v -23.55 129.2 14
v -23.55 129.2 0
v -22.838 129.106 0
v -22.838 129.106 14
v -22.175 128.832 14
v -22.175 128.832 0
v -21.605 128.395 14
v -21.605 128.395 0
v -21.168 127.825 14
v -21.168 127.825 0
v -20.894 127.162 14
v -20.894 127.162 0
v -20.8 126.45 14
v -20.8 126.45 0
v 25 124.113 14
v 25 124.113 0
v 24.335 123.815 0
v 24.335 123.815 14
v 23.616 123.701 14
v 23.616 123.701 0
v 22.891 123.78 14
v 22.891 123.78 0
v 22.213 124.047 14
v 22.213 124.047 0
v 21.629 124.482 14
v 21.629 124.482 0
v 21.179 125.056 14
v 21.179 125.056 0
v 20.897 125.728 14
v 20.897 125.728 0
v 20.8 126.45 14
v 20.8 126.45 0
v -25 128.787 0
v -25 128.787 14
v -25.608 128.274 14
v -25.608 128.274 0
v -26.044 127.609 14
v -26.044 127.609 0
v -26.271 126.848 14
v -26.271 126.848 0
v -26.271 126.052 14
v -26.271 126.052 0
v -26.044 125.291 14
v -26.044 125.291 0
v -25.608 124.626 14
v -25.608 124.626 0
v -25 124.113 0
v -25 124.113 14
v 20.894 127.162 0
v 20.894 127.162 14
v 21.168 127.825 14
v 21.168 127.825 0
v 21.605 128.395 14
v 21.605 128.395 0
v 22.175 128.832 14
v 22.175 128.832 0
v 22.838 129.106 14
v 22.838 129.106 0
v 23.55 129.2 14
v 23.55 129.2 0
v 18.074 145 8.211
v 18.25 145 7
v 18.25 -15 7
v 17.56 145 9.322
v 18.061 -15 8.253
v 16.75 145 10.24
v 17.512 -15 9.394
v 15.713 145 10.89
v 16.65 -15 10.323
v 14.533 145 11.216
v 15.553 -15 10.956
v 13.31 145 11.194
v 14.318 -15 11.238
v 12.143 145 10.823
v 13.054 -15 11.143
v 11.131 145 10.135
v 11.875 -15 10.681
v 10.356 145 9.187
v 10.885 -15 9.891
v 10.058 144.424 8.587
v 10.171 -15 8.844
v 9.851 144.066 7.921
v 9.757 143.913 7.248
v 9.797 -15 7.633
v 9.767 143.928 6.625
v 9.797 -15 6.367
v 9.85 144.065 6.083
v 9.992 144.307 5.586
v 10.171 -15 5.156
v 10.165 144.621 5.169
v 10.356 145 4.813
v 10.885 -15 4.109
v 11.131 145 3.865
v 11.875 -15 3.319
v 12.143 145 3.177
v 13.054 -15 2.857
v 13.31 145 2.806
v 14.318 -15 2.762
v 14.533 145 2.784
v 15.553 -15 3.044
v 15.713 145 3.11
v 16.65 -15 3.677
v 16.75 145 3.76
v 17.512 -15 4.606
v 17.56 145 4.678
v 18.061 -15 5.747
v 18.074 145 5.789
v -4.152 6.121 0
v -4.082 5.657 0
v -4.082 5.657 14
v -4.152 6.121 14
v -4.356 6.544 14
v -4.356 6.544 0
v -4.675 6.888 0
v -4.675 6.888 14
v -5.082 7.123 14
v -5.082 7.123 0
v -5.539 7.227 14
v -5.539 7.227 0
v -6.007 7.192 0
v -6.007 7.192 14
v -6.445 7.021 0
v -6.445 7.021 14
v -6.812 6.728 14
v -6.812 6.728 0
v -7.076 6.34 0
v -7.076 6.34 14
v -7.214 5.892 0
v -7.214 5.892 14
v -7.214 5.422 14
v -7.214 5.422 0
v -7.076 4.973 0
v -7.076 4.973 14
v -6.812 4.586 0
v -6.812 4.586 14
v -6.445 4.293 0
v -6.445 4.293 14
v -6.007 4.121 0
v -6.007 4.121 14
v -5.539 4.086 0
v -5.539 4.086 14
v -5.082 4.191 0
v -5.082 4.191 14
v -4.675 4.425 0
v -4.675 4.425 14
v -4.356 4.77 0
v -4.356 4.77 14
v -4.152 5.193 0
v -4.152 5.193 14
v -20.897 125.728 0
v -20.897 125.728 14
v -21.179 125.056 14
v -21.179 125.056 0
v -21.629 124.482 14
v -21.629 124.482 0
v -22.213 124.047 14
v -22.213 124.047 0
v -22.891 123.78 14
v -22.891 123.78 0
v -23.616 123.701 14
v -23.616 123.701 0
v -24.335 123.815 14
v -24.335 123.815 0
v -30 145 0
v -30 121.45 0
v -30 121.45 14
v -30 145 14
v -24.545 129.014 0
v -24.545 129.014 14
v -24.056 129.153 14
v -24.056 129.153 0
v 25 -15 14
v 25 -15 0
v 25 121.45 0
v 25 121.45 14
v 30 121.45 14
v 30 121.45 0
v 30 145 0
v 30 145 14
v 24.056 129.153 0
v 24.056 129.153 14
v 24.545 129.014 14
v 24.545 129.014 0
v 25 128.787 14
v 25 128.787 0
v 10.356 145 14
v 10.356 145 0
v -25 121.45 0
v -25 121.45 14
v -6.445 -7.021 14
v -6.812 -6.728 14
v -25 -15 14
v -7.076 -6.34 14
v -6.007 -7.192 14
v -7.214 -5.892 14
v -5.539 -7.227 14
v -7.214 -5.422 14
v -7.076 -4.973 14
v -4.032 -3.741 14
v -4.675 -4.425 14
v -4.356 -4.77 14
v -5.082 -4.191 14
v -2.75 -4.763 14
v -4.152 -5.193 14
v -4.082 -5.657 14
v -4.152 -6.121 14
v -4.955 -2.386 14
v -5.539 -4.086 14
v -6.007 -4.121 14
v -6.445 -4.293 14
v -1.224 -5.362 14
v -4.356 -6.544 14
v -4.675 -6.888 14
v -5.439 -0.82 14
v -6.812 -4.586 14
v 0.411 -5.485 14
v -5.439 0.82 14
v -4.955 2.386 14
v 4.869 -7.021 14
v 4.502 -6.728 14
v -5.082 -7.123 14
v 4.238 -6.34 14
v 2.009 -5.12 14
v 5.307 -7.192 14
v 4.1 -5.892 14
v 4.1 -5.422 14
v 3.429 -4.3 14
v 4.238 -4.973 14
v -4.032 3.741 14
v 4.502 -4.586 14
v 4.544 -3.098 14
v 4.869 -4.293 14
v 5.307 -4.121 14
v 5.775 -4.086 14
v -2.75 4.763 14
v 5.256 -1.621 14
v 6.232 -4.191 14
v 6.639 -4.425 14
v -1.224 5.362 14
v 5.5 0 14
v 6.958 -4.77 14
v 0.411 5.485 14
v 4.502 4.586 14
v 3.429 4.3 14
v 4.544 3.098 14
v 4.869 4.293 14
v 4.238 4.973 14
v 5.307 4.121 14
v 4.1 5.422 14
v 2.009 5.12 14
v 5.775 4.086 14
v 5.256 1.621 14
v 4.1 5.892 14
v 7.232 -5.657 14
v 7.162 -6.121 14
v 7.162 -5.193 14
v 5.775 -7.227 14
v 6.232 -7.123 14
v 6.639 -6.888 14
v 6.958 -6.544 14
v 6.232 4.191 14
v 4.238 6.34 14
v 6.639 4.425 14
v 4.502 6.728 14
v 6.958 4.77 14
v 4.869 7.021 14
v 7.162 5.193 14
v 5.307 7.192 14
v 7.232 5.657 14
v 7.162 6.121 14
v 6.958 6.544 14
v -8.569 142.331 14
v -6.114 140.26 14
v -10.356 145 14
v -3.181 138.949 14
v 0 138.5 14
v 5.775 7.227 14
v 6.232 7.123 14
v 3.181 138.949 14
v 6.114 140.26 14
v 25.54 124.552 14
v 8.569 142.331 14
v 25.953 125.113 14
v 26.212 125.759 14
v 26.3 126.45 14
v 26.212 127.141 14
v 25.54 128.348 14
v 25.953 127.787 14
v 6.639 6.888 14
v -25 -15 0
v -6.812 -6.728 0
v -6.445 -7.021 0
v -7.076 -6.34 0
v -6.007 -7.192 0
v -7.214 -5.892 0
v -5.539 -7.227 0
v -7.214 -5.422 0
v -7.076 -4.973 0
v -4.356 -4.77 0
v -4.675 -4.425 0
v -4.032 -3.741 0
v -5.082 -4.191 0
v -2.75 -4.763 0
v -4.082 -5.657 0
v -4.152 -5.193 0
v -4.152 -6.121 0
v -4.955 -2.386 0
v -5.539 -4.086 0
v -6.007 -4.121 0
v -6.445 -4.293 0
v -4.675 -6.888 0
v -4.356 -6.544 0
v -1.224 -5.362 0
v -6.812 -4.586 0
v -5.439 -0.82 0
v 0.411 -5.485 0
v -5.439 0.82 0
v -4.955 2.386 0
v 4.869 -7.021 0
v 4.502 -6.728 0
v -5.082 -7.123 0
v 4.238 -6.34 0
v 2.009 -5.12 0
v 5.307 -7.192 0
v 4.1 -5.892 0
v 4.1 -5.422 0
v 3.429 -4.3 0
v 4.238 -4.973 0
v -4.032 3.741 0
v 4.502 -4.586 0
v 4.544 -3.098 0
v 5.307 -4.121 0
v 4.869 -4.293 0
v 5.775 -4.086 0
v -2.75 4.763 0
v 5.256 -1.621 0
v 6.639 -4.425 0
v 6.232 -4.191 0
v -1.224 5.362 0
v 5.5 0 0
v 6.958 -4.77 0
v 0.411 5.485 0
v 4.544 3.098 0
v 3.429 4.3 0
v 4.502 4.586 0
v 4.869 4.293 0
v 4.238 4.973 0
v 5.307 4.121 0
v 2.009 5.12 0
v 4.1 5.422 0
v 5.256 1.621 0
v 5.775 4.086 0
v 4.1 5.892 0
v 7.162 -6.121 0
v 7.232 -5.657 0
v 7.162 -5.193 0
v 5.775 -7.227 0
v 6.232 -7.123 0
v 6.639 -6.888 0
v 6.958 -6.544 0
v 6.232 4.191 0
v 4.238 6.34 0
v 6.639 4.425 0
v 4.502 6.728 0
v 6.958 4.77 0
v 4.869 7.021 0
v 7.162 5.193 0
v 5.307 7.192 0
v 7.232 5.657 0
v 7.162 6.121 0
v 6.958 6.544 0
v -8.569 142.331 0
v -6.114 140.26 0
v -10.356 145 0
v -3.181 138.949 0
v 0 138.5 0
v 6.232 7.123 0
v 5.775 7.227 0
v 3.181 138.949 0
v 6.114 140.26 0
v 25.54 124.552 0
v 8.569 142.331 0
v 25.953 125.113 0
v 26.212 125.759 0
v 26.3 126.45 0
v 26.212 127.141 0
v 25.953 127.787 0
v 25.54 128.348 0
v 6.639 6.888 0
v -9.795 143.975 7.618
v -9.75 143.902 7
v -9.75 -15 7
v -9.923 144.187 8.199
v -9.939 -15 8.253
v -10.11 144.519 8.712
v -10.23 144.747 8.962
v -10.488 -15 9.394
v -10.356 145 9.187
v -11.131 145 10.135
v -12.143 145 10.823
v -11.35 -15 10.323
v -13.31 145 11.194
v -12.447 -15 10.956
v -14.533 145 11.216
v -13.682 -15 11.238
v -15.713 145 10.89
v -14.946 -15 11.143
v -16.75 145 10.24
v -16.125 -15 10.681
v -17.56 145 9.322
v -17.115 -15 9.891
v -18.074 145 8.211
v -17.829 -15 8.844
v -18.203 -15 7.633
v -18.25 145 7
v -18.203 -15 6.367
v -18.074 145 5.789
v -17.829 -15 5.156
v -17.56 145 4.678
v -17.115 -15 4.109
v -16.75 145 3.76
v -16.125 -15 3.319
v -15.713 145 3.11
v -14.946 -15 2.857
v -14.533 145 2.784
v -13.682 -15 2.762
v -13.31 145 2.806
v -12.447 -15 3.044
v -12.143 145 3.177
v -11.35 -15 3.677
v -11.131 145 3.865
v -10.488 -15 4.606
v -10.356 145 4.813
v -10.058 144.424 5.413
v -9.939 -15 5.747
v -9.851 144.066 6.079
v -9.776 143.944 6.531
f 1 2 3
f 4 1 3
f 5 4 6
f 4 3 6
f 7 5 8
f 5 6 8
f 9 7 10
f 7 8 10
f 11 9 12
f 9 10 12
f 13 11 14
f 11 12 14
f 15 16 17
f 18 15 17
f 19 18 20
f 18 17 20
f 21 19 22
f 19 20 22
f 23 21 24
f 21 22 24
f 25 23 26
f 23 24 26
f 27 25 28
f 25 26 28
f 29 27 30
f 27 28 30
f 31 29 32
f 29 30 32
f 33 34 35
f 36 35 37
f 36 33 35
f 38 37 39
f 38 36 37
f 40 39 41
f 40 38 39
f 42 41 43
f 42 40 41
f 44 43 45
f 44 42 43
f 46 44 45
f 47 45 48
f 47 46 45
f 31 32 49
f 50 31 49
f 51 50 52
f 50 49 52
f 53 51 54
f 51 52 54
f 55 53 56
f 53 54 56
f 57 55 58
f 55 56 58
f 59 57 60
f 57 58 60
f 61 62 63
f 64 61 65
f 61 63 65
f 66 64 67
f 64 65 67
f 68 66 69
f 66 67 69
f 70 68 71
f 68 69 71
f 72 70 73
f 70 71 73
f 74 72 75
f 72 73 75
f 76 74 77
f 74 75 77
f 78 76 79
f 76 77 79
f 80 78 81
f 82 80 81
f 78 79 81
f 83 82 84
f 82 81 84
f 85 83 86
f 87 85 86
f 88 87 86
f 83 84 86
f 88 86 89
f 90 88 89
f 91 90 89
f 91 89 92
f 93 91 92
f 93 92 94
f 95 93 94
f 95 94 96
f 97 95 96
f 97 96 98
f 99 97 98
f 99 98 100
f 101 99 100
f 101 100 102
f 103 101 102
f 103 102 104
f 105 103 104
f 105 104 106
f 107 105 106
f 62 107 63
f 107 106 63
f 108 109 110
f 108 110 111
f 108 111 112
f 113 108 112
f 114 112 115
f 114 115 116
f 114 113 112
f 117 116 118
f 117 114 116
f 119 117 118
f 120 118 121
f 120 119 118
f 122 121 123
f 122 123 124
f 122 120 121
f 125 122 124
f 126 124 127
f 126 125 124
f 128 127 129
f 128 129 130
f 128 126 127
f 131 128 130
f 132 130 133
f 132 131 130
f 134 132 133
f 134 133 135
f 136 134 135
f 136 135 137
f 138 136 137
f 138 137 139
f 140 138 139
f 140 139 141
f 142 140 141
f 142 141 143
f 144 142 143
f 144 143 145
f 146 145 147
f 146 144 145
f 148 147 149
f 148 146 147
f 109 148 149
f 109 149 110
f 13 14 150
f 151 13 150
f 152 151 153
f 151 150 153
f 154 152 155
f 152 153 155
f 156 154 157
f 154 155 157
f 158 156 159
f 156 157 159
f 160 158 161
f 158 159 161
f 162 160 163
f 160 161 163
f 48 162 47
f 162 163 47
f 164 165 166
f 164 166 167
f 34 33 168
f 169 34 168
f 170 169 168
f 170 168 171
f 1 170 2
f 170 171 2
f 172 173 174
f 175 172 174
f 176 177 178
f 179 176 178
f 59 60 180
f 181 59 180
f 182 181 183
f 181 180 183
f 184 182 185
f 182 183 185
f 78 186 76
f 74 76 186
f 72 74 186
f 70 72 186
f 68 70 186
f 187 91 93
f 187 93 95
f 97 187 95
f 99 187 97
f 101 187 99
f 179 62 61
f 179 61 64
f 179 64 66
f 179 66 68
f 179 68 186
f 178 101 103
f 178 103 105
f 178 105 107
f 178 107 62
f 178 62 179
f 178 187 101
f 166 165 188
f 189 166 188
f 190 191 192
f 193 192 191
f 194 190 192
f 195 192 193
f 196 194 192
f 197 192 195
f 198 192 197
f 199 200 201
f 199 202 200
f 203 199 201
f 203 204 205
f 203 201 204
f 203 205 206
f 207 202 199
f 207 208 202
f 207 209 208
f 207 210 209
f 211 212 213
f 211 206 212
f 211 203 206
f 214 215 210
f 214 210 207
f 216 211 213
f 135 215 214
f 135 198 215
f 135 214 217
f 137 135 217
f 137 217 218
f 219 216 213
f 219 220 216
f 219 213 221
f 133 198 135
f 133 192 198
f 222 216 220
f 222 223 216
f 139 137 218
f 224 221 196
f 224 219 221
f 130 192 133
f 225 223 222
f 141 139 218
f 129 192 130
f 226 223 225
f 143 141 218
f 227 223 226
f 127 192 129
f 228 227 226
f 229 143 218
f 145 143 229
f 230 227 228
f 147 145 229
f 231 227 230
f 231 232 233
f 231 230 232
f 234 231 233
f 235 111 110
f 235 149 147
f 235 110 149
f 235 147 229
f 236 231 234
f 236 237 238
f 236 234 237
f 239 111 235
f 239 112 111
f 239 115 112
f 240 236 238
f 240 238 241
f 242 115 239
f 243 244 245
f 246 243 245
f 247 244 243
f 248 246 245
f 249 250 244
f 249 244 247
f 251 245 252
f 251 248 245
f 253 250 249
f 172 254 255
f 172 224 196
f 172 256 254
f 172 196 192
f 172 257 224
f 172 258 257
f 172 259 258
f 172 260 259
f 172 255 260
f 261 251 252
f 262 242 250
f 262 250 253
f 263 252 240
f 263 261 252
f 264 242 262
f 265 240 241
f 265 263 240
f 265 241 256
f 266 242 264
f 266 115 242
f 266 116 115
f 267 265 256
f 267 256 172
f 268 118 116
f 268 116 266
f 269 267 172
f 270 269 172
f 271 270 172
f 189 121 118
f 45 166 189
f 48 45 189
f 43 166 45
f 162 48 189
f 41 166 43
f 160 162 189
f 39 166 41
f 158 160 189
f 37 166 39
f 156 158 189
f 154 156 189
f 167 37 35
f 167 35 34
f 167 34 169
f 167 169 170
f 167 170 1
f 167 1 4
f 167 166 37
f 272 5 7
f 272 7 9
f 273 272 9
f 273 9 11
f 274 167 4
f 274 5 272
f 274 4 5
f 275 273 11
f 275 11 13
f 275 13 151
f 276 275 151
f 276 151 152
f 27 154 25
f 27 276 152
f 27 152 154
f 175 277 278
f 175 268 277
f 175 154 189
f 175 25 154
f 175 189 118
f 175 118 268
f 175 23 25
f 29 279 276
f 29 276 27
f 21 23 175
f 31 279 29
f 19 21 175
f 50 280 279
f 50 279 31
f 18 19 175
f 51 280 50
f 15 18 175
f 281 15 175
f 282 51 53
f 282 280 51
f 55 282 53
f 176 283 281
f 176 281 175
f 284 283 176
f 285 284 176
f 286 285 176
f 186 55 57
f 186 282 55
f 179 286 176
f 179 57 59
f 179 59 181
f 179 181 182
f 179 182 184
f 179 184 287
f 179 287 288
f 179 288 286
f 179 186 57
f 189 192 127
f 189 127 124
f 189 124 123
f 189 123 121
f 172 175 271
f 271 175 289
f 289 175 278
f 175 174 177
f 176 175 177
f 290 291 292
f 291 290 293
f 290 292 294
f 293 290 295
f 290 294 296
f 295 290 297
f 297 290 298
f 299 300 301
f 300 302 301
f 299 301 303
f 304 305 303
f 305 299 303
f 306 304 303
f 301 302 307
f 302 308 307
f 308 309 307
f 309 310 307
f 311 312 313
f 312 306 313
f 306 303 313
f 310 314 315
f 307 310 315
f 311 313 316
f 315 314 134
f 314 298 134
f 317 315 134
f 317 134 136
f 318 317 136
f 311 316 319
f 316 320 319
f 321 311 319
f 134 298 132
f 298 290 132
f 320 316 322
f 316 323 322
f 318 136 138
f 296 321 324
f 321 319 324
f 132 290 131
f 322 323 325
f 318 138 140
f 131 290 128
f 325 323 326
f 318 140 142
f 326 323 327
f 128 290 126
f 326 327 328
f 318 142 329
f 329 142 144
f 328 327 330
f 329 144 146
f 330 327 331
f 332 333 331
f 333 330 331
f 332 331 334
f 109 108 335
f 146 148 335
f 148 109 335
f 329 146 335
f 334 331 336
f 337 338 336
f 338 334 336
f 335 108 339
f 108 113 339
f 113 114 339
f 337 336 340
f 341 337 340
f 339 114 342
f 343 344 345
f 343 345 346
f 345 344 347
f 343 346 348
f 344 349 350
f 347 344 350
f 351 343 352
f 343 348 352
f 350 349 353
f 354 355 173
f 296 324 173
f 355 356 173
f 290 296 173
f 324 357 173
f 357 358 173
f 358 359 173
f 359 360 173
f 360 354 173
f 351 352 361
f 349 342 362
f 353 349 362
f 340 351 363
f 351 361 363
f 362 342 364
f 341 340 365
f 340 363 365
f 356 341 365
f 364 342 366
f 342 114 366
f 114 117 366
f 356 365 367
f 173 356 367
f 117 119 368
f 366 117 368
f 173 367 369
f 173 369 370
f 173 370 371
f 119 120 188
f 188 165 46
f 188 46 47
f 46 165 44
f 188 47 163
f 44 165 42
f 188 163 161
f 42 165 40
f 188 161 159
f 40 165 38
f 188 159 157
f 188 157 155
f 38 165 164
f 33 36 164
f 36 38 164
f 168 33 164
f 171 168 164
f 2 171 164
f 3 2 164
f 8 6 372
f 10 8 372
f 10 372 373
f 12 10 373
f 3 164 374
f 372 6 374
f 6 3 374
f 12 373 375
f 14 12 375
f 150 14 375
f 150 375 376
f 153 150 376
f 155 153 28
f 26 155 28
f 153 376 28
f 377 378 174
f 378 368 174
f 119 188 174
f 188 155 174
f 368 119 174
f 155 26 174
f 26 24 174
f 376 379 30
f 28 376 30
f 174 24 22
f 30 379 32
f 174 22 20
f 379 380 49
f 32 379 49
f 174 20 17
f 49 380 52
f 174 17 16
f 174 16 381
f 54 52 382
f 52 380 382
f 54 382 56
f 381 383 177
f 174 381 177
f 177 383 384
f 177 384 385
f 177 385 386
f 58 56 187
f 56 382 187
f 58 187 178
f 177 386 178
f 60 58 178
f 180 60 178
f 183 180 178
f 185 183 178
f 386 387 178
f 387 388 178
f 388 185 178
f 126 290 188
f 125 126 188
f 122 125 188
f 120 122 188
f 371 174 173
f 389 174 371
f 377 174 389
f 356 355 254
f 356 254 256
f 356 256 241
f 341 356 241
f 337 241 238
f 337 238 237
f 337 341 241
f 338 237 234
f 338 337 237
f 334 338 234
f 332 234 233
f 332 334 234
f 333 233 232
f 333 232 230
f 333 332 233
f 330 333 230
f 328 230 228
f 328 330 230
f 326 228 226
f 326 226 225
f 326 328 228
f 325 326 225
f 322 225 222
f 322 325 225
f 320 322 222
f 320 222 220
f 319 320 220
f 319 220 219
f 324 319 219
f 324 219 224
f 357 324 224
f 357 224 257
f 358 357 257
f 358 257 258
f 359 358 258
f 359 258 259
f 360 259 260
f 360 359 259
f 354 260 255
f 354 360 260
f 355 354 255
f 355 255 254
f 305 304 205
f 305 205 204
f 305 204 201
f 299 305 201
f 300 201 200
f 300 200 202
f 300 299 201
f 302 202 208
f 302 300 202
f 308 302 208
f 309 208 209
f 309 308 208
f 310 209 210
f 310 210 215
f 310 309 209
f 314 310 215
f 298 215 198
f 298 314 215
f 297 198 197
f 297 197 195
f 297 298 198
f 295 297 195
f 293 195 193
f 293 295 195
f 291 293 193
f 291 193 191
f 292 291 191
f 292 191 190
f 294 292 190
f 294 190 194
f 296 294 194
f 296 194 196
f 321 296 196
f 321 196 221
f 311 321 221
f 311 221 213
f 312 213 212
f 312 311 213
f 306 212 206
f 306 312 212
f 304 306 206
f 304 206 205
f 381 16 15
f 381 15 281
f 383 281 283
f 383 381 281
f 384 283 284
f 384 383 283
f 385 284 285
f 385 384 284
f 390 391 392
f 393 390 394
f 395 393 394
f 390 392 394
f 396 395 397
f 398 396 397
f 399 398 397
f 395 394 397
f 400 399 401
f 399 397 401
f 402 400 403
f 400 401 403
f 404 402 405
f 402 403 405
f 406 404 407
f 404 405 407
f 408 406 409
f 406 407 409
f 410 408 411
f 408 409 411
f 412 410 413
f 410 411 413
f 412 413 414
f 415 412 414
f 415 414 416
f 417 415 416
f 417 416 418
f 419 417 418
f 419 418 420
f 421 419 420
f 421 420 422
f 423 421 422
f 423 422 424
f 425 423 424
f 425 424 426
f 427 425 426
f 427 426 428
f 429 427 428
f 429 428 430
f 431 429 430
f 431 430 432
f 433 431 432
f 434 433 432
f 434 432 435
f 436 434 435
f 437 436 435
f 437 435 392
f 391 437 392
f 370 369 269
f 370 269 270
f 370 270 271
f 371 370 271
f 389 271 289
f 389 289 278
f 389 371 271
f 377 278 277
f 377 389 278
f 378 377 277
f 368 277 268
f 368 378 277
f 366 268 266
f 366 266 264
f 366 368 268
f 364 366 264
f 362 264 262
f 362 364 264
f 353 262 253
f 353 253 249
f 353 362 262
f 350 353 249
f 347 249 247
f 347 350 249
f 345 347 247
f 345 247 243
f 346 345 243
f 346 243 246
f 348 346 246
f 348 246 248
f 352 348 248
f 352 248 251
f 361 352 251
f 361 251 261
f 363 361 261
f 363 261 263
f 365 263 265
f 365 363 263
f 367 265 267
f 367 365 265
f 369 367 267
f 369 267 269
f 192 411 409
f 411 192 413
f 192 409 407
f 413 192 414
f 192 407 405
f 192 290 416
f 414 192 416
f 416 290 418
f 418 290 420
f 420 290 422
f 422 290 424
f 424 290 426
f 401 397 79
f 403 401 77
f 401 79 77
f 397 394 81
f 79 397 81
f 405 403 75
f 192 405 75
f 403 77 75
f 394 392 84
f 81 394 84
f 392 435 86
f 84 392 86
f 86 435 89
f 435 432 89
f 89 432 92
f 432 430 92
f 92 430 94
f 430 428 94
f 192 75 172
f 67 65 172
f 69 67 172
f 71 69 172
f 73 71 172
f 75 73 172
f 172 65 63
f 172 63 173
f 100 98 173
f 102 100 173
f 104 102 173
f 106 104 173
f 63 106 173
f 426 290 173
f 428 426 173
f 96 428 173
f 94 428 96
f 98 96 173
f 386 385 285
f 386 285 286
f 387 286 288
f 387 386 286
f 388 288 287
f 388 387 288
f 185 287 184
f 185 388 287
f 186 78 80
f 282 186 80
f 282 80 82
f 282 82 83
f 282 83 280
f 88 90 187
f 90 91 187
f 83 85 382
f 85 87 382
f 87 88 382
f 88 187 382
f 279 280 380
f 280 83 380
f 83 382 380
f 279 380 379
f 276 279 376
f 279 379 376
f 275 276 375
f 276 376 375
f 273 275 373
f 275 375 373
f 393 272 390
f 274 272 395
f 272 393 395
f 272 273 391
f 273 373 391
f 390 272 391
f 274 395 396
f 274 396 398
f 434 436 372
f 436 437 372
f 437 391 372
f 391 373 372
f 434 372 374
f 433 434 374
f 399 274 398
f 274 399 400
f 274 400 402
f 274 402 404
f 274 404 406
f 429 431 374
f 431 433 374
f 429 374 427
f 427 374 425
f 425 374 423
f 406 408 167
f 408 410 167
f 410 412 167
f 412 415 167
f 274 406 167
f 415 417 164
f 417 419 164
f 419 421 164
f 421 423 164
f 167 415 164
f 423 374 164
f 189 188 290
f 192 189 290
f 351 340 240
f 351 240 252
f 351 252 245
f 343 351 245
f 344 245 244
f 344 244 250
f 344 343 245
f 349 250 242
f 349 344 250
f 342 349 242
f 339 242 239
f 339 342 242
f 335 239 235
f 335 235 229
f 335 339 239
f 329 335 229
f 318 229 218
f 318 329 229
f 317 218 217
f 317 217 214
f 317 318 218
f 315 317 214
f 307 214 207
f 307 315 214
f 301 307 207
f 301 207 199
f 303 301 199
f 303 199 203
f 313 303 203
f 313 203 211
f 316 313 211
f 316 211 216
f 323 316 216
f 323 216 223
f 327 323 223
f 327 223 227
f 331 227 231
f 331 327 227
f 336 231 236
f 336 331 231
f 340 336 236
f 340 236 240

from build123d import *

# Parameters (mm, degrees)
F0_R     = 1.575
F0_R_2   = 5.5
F1_DEPTH = 14
F3_R     = 4.25
F4_DEPTH = 200
F5_W     = 5
F5_H     = 23.55
F6_DEPTH = 14
F7_DEPTH = 25


with BuildPart() as f1:
    # F0 (on Top) → F1 (new body)
    with BuildSketch(Plane.XY):
        with BuildLine():
            Line((-25, -15), (0, -15))
            Line((0, -15), (25, -15))
            Line((25, -15), (25, 0))
            Line((25, 0), (25, 124.1133357109))
            ThreePointArc((25, 124.1133357109), (22.2130258043, 124.0468770319), (20.8, 126.45))
            Line((20.8, 126.45), (-20.8, 126.45))
            ThreePointArc((-20.8, 126.45), (-22.2130258043, 124.0468770319), (-25, 124.1133357109))
            Line((-25, 124.1133357109), (-25, 0))
            Line((-25, 0), (-25, -15))
        make_face()
        with Locations((-5.657, -5.656855)):
            Circle(F0_R, mode=Mode.SUBTRACT)
        with Locations((-5.657, 5.656855)):
            Circle(F0_R, mode=Mode.SUBTRACT)
        with Locations((5.657, -5.656855)):
            Circle(F0_R, mode=Mode.SUBTRACT)
        Circle(F0_R_2, mode=Mode.SUBTRACT)
        with Locations((5.657, 5.656855)):
            Circle(F0_R, mode=Mode.SUBTRACT)
        with BuildLine():
            Line((-20.8, 126.45), (20.8, 126.45))
            ThreePointArc((20.8, 126.45), (21.6054563517, 128.3945436483), (23.55, 129.2))
            Line((23.55, 129.2), (23.55, 145))
            Line((23.55, 145), (10.3561575886, 145))
            ThreePointArc((10.3561575886, 145), (0, 138.5), (-10.3561575886, 145))
            Line((-10.3561575886, 145), (-23.55, 145))
            Line((-23.55, 145), (-23.55, 129.2))
            ThreePointArc((-23.55, 129.2), (-21.6054563517, 128.3945436483), (-20.8, 126.45))
        make_face()
        with BuildLine():
            Line((-25, 145), (-25, 128.7866642891))
            ThreePointArc((-25, 128.7866642891), (-24.3038810267, 129.0946480669), (-23.55, 129.2))
            Line((-23.55, 129.2), (-23.55, 145))
            Line((-23.55, 145), (-25, 145))
        make_face()
        with BuildLine():
            ThreePointArc((23.55, 129.2), (24.3038810267, 129.0946480669), (25, 128.7866642891))
            Line((25, 128.7866642891), (25, 145))
            Line((25, 145), (23.55, 145))
            Line((23.55, 145), (23.55, 129.2))
        make_face()
    extrude(amount=F1_DEPTH)

    # F3 (on offset) → F4 (cut)
    with BuildSketch(Plane.XZ.offset(15)):
        with Locations((-14, 7)):
            Circle(F3_R)
        with Locations((14, 7)):
            Circle(F3_R)
    extrude(amount=-F4_DEPTH, mode=Mode.SUBTRACT)

    # F5 (on Top) → F6 (join)
    with BuildSketch(Plane.XY):
        with Locations((27.5, 133.225)):
            Rectangle(F5_W, F5_H)
        with Locations((-27.5, 133.225)):
            Rectangle(F5_W, F5_H)
    extrude(amount=F6_DEPTH)

    # F0 (on Top) → F7 (cut)
    with BuildSketch(Plane.XY):
        with BuildLine():
            ThreePointArc((20.8, 126.45), (22.2130258043, 124.0468770319), (25, 124.1133357109))
            Line((25, 124.1133357109), (25, 128.7866642891))
            ThreePointArc((25, 128.7866642891), (24.3038810267, 129.0946480669), (23.55, 129.2))
            Line((23.55, 129.2), (23.55, 126.45))
            Line((23.55, 126.45), (20.8, 126.45))
        make_face()
        with BuildLine():
            Line((25, 128.7866642891), (25, 124.1133357109))
            ThreePointArc((25, 124.1133357109), (25.9531229681, 125.1130258043), (26.3, 126.45))
            ThreePointArc((26.3, 126.45), (25.9531229681, 127.7869741957), (25, 128.7866642891))
        make_face()
        with BuildLine():
            ThreePointArc((23.55, 129.2), (21.6054563517, 128.3945436483), (20.8, 126.45))
            Line((20.8, 126.45), (23.55, 126.45))
            Line((23.55, 126.45), (23.55, 129.2))
        make_face()
        with BuildLine():
            ThreePointArc((-25, 128.7866642891), (-26.3, 126.45), (-25, 124.1133357109))
            Line((-25, 124.1133357109), (-25, 128.7866642891))
        make_face()
        with BuildLine():
            Line((-25, 128.7866642891), (-25, 124.1133357109))
            ThreePointArc((-25, 124.1133357109), (-22.2130258043, 124.0468770319), (-20.8, 126.45))
            Line((-20.8, 126.45), (-23.55, 126.45))
            Line((-23.55, 126.45), (-23.55, 129.2))
            ThreePointArc((-23.55, 129.2), (-24.3038810267, 129.0946480669), (-25, 128.7866642891))
        make_face()
        with BuildLine():
            Line((-23.55, 126.45), (-20.8, 126.45))
            ThreePointArc((-20.8, 126.45), (-21.6054563517, 128.3945436483), (-23.55, 129.2))
            Line((-23.55, 129.2), (-23.55, 126.45))
        make_face()
    extrude(amount=F7_DEPTH, mode=Mode.SUBTRACT)


solid = f1.part
